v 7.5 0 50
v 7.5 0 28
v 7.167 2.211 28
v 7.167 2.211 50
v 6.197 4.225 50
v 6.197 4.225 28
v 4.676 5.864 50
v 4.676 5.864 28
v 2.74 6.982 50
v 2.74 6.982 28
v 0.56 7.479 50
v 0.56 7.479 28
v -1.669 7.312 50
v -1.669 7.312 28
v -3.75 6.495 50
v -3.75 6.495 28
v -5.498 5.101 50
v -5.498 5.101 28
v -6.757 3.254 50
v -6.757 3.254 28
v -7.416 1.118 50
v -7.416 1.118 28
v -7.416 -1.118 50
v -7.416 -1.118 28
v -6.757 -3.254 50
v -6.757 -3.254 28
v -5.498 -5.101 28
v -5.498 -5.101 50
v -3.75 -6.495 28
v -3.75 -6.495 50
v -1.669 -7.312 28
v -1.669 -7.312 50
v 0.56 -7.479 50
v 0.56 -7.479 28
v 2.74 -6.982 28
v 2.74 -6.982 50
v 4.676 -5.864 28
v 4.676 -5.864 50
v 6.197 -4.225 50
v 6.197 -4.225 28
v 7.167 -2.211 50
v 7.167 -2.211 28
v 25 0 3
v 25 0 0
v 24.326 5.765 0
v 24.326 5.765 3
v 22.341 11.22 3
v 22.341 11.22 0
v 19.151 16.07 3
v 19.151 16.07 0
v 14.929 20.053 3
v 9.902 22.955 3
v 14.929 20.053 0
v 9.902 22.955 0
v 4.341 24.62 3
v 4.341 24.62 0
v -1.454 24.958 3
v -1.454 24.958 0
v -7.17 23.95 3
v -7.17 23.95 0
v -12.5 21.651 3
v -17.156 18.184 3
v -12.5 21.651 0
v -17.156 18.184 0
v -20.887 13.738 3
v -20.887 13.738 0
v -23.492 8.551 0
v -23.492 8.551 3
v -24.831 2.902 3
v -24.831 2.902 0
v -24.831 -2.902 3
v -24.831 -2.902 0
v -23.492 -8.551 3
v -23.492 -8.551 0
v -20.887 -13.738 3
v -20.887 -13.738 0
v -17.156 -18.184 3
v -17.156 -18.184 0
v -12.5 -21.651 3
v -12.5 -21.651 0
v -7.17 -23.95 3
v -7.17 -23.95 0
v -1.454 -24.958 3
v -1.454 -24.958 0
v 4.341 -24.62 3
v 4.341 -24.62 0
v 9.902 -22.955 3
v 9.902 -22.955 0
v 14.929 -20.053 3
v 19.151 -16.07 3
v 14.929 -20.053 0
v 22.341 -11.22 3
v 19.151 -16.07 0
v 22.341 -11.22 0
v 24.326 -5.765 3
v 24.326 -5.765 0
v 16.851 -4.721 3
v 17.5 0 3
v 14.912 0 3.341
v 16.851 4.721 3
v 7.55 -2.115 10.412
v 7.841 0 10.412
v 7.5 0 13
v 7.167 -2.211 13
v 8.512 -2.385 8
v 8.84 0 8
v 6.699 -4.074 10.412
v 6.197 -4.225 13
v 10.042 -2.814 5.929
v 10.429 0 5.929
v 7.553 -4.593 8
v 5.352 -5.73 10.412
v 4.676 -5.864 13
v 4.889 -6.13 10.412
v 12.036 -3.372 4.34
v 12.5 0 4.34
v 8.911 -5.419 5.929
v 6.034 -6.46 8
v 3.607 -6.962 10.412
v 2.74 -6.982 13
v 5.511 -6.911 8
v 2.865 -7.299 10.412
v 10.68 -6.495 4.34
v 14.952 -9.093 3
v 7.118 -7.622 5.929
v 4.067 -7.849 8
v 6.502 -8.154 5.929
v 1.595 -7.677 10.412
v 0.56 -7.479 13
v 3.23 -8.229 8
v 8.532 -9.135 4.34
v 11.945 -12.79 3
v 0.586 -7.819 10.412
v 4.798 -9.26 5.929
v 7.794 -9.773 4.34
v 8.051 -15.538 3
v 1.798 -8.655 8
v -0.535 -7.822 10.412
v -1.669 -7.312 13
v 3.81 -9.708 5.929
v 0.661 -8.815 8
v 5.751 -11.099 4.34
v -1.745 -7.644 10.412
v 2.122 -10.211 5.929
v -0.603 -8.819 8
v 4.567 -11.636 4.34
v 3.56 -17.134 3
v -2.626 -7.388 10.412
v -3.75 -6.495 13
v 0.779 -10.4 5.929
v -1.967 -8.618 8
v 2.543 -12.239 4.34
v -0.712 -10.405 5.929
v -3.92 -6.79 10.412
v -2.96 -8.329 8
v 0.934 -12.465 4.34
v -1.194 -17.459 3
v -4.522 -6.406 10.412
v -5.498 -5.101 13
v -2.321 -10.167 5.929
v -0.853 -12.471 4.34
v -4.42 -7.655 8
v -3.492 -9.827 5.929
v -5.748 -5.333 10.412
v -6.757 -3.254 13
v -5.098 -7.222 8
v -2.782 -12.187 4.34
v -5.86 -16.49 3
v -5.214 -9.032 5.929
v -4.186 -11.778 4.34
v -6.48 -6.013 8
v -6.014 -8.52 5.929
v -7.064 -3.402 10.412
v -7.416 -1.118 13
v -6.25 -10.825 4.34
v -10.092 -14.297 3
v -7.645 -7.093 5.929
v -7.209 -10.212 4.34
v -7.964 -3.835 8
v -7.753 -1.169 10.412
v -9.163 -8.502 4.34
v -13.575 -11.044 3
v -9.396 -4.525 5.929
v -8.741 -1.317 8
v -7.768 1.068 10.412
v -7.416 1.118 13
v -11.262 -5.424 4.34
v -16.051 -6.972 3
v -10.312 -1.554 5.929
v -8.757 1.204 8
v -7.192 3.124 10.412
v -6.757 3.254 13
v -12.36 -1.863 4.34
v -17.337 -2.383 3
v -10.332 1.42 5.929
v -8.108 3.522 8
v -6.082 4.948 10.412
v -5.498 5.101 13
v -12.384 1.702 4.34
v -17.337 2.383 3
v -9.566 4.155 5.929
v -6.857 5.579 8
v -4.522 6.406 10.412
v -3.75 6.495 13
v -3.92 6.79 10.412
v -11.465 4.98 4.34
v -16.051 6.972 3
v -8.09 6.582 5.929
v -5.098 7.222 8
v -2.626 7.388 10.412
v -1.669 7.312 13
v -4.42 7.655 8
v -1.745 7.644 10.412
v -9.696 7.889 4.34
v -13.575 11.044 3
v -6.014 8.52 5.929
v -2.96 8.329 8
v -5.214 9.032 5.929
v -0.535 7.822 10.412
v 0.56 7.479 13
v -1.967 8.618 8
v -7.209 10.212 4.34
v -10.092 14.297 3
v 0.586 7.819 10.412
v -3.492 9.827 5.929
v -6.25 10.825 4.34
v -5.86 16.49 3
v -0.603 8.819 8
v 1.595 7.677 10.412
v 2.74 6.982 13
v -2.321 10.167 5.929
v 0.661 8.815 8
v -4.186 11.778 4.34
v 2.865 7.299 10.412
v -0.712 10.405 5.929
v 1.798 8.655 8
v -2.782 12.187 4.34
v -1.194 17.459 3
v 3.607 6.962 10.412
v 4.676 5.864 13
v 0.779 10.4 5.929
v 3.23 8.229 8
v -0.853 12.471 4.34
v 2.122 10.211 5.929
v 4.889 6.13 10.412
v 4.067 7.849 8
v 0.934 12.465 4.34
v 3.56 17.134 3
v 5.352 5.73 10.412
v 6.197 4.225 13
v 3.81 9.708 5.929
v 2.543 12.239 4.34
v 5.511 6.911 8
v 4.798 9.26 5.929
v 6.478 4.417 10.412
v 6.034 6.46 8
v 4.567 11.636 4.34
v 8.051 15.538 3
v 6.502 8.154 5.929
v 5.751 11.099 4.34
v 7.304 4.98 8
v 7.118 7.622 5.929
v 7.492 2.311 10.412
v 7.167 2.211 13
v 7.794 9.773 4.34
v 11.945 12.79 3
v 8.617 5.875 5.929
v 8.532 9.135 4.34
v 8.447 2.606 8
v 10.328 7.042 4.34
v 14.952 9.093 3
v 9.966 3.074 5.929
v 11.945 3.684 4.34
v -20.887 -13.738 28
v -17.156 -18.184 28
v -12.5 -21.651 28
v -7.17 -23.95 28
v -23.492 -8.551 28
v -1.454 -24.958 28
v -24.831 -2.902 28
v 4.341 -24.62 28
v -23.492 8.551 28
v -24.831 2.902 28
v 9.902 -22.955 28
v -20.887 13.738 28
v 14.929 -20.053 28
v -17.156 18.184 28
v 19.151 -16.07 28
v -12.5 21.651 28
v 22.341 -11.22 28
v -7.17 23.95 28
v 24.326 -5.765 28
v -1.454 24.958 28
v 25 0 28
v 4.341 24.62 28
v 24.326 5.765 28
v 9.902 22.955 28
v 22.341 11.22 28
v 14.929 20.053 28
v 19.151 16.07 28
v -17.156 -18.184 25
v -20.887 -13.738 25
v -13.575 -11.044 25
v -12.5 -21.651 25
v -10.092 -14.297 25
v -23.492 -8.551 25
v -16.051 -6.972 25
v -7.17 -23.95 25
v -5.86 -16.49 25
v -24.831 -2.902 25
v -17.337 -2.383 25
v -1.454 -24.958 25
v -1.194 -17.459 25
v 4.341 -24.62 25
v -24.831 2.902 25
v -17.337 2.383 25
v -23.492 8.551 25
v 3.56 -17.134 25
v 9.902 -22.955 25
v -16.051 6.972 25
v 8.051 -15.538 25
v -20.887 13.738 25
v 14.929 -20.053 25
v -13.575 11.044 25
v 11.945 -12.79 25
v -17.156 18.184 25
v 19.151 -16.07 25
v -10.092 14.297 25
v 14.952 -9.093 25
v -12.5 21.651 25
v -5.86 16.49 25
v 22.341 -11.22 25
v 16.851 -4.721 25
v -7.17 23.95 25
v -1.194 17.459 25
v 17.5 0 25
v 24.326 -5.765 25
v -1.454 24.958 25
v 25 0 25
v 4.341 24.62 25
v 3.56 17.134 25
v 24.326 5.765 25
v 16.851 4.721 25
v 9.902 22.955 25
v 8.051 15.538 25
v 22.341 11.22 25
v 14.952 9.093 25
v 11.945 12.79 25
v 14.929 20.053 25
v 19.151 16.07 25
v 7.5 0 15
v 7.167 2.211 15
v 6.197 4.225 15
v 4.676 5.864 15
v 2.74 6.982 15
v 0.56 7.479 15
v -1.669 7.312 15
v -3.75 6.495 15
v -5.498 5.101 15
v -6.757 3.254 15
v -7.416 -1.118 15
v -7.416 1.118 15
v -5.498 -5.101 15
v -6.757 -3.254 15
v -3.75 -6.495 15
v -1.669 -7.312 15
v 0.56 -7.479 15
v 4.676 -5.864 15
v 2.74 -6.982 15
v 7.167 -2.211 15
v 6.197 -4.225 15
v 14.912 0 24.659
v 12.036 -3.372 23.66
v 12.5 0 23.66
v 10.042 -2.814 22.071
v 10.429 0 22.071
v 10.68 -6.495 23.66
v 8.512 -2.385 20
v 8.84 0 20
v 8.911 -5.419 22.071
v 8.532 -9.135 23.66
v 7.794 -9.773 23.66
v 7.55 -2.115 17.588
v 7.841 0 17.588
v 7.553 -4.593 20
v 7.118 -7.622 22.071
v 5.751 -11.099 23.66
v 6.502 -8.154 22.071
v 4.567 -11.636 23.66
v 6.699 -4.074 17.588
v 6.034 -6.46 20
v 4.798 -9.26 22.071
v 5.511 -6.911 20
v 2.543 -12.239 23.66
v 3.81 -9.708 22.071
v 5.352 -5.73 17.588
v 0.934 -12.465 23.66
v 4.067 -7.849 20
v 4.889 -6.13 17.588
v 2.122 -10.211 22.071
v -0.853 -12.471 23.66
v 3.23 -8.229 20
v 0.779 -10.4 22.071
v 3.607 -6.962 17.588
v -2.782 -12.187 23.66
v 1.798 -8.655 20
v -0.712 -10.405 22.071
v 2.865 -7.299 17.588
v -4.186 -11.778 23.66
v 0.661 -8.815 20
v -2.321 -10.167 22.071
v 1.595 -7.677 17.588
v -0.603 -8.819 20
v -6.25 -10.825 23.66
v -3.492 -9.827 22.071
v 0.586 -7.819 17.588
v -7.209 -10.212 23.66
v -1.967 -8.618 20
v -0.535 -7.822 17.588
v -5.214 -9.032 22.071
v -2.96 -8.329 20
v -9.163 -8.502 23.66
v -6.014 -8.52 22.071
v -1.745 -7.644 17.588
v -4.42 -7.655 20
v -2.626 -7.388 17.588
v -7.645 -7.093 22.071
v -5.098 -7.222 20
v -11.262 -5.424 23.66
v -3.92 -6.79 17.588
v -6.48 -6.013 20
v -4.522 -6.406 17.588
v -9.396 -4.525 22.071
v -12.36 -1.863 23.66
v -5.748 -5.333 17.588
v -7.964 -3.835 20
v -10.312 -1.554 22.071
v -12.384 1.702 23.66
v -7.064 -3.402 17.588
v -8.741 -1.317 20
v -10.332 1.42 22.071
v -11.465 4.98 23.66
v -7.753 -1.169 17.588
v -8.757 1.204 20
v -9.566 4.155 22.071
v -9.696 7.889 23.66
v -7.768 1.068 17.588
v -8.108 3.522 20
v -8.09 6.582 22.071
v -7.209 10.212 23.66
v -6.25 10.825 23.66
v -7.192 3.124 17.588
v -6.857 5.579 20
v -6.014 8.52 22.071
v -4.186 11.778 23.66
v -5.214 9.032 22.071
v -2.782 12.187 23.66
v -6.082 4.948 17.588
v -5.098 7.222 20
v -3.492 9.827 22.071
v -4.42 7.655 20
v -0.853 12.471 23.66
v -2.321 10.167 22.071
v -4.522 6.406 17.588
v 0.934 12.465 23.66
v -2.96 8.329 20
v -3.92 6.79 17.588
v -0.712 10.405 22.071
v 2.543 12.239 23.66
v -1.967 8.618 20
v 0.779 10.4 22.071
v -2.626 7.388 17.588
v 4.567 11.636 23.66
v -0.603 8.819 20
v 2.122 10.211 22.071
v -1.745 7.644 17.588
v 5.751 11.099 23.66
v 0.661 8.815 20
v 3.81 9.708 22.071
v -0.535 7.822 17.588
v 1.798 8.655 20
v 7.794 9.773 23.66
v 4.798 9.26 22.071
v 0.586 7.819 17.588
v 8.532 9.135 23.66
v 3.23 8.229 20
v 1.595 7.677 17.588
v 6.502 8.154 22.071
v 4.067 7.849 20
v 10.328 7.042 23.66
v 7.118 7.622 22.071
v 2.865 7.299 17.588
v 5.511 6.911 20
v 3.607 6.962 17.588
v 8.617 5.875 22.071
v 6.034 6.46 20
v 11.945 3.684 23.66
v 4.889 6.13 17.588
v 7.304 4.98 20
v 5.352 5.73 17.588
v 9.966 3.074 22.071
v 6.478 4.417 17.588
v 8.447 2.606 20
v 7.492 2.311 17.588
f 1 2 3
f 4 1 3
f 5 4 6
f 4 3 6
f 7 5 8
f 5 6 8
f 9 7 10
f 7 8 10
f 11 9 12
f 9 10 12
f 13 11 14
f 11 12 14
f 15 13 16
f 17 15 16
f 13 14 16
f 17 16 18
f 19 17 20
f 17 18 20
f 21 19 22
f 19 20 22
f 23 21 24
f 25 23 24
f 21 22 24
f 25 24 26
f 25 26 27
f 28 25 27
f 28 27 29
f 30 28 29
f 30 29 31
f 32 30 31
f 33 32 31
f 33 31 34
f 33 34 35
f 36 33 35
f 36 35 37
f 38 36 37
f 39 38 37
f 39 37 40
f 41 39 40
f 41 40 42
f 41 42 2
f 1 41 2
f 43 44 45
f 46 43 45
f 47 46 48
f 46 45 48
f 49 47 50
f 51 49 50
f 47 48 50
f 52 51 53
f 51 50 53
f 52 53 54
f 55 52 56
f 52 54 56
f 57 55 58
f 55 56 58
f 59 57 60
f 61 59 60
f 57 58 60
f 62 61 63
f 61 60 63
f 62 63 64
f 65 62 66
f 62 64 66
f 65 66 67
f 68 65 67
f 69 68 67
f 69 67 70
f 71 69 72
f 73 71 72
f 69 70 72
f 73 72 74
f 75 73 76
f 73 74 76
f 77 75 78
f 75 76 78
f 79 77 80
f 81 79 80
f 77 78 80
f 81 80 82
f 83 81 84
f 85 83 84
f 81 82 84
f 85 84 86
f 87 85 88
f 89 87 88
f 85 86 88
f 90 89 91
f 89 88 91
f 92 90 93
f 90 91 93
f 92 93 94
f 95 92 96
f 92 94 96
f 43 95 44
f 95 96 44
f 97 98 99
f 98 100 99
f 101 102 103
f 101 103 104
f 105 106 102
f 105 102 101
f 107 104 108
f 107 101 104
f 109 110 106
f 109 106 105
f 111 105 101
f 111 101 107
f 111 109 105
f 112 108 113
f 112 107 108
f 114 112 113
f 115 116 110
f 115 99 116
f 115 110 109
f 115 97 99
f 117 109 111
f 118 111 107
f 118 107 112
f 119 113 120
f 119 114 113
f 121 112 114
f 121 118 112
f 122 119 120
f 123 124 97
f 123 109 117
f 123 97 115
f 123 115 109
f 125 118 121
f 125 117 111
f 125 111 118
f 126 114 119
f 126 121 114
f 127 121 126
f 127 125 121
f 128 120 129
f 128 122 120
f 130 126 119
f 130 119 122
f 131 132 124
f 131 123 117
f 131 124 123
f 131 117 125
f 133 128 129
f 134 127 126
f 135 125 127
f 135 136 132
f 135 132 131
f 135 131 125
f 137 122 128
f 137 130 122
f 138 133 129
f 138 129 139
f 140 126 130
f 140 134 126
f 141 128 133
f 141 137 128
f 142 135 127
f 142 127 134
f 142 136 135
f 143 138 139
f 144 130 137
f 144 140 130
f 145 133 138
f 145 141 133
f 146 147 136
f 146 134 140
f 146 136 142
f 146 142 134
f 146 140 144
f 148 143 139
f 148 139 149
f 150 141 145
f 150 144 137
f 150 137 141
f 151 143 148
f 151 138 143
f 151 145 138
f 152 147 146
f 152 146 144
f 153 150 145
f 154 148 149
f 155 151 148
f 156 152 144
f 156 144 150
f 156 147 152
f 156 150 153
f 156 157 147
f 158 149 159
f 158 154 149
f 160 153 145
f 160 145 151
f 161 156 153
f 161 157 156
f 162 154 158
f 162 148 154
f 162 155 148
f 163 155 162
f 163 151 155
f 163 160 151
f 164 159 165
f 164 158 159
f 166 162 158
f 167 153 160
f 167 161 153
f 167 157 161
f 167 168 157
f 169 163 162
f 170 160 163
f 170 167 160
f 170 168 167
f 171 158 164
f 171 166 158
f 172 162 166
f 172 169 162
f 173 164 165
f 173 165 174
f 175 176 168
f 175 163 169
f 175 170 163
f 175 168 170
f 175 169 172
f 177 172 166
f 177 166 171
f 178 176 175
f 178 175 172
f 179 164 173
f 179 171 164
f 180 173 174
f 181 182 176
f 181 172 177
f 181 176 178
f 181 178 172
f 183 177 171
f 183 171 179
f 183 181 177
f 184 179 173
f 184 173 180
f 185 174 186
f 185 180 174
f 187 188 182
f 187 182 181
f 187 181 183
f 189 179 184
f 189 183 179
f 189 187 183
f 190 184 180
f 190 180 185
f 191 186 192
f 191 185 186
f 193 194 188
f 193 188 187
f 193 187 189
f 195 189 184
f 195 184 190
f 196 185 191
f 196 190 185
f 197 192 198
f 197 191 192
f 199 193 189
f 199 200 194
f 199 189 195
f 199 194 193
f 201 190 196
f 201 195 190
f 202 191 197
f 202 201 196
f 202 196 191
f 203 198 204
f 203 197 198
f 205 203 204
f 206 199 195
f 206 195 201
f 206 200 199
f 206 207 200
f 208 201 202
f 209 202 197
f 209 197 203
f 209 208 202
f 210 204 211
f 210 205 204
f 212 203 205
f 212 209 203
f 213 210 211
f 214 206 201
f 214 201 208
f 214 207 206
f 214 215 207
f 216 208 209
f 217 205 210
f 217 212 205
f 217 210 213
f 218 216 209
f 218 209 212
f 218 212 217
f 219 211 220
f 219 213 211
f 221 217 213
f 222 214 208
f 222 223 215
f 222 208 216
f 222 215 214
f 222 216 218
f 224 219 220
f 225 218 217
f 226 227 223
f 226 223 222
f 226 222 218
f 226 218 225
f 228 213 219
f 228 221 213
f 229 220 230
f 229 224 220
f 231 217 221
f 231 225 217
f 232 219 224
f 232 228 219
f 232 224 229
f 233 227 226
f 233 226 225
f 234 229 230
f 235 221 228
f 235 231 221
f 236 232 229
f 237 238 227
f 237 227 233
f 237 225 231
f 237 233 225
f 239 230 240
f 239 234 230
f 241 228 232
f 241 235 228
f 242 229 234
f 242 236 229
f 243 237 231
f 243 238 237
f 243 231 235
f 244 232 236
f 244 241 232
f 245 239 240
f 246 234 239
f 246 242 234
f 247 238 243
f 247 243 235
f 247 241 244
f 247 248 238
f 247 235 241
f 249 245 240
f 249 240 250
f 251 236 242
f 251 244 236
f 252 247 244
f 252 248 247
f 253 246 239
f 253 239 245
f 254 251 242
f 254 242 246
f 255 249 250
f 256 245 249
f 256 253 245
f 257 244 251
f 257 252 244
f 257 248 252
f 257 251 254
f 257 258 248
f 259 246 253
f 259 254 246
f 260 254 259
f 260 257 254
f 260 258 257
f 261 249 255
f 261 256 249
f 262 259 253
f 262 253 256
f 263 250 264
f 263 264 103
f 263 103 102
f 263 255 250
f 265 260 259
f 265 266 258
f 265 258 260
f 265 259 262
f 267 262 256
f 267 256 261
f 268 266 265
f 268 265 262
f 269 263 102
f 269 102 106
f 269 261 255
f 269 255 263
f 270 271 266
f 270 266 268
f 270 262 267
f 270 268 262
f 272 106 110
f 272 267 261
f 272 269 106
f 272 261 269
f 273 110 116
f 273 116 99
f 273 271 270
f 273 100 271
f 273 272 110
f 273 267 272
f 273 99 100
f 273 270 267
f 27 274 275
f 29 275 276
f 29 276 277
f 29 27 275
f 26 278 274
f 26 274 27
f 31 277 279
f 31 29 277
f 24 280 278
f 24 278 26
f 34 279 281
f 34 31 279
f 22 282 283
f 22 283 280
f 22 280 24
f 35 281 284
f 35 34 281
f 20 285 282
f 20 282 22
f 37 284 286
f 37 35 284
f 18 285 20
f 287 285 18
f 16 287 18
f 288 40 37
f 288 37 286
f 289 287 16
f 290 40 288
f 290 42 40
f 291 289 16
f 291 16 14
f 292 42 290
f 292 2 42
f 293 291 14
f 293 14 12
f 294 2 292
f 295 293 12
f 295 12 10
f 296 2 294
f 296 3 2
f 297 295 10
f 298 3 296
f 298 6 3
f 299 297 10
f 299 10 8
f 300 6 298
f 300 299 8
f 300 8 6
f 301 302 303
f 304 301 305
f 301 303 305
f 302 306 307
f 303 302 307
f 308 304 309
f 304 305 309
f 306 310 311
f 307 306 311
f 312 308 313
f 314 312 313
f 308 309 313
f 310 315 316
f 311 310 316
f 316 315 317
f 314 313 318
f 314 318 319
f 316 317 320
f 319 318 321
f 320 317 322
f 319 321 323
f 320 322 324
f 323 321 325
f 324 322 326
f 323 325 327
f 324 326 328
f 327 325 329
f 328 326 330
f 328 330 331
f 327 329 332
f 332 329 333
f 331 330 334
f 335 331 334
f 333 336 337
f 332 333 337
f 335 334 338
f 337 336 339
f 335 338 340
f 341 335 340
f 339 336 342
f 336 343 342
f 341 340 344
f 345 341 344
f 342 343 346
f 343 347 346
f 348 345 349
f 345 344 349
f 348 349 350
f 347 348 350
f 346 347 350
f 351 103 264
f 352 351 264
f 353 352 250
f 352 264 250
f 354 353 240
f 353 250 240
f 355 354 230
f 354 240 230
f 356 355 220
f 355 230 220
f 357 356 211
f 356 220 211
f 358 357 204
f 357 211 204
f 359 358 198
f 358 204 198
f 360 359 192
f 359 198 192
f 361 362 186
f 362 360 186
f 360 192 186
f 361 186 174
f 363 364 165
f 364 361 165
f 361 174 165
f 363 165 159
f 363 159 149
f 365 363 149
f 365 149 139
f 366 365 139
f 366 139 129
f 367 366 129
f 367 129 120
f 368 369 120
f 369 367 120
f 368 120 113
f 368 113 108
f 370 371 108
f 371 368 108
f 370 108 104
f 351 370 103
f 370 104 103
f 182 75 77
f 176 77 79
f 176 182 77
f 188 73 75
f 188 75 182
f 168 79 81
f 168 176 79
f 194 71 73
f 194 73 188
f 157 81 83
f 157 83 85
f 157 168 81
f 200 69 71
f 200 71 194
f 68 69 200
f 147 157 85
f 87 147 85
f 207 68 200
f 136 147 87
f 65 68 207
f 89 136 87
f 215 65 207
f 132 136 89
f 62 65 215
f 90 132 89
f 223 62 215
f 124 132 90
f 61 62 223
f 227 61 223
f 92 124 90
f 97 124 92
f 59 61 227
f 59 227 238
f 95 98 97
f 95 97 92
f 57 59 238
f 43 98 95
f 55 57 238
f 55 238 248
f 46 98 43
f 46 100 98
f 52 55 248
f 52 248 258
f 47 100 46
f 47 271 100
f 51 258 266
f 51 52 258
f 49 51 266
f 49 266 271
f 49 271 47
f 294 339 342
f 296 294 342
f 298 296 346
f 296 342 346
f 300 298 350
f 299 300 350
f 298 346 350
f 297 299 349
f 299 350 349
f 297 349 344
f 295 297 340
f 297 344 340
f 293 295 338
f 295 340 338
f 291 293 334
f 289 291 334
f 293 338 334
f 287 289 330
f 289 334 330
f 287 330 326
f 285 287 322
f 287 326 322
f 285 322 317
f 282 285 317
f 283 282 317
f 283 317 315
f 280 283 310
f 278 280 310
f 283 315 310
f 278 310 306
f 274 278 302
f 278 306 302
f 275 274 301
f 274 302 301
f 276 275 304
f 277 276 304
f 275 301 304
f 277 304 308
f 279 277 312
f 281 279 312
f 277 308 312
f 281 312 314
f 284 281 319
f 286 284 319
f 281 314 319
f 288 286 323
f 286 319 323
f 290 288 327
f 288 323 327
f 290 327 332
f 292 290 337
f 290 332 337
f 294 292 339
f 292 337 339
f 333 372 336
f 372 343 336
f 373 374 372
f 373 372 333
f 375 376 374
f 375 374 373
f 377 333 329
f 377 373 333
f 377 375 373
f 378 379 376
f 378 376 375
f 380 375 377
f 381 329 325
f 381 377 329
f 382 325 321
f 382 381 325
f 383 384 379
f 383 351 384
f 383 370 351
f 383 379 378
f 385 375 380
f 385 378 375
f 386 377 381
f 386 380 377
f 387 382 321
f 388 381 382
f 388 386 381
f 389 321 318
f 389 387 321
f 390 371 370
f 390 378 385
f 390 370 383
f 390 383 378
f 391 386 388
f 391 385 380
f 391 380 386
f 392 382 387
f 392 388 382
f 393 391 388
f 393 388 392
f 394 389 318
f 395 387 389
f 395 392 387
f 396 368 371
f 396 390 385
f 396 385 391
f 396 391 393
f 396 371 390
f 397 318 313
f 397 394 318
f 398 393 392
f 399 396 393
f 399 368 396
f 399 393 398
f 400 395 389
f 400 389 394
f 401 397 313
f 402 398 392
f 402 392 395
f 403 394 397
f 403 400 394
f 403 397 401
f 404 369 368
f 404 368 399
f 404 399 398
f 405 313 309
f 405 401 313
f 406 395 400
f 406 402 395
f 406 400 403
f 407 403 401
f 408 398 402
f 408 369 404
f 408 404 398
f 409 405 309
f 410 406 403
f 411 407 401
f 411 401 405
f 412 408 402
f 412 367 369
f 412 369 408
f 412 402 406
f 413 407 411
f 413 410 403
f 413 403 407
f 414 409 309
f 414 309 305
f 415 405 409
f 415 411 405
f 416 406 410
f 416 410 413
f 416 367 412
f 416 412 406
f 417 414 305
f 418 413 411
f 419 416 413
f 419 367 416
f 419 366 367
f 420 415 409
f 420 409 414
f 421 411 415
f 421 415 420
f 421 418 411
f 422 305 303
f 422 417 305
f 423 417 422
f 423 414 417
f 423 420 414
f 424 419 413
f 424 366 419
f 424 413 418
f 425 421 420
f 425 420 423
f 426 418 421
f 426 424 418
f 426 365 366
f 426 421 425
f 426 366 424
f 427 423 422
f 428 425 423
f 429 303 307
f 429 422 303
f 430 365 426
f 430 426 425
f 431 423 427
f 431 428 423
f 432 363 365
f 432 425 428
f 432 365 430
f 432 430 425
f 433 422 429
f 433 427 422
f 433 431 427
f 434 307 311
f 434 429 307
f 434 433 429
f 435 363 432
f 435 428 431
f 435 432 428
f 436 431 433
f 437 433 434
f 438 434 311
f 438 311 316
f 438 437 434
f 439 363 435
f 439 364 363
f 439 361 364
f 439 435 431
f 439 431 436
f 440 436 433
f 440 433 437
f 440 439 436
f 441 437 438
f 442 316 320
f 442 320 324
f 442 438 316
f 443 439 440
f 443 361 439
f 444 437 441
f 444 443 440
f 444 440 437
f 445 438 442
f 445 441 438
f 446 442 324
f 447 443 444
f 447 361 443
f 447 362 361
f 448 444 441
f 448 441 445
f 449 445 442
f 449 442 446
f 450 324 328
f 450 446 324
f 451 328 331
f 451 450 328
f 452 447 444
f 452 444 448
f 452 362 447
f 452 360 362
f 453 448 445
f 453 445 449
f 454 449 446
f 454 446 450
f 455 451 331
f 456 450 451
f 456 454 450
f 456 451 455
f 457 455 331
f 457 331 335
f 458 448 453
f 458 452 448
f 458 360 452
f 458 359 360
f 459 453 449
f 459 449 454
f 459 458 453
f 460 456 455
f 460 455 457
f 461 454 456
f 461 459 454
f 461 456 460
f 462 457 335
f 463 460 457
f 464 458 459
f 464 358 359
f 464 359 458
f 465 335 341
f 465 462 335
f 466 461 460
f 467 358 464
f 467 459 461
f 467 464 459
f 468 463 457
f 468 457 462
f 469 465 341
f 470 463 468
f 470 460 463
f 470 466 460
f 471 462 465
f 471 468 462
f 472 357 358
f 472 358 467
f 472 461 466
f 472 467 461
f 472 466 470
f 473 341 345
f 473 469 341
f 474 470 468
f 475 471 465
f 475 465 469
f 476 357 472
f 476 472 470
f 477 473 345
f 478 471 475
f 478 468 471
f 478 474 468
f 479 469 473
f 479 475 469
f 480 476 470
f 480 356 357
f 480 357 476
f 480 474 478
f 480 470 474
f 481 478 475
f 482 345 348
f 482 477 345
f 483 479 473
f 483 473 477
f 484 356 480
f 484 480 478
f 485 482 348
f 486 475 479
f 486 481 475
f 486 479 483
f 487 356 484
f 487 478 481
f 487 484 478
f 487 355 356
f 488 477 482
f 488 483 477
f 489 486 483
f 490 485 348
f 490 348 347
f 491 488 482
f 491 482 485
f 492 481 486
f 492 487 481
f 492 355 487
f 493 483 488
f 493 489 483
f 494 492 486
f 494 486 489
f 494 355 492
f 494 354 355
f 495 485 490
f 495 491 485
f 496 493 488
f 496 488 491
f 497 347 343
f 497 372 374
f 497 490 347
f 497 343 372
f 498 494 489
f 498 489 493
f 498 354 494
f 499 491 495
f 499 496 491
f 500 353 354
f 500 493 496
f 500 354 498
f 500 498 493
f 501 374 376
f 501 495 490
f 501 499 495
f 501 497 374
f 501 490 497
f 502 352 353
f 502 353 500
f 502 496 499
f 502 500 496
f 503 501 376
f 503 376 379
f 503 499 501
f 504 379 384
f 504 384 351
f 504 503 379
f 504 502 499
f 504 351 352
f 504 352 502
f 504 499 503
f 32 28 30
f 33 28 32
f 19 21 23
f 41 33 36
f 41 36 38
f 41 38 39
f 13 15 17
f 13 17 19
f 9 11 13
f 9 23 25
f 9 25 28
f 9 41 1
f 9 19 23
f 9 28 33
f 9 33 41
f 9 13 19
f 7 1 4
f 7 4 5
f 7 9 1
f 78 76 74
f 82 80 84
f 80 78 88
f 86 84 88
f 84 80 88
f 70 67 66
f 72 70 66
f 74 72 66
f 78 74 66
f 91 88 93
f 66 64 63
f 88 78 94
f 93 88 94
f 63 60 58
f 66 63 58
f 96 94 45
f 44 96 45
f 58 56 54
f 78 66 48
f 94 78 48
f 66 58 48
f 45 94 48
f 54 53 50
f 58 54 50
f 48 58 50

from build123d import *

# Parameters (mm, degrees)
CROQUIS1_R              = 7.5
SALIENTE_EXTRUIR2_DEPTH = 50
CROQUIS4_R              = 25
SALIENTE_EXTRUIR3_DEPTH = 3
SALIENTE_EXTRUIR4_START = 25
CROQUIS5_R              = 25
SALIENTE_EXTRUIR4_DEPTH = 3
REDONDEO2_R             = 10


with BuildPart() as part:
    # Croquis1 → Saliente-Extruir2 (new body)
    with BuildSketch(Plane.XY):
        Circle(CROQUIS1_R)
    extrude(amount=SALIENTE_EXTRUIR2_DEPTH)

    # Croquis4 → Saliente-Extruir3 (add)
    with BuildSketch(Plane.XY):
        Circle(CROQUIS4_R)
    extrude(amount=SALIENTE_EXTRUIR3_DEPTH)

    # Croquis5 → Saliente-Extruir4 (add)
    with BuildSketch(Plane.XY.offset(SALIENTE_EXTRUIR4_START)):
        Circle(CROQUIS5_R)
    extrude(amount=SALIENTE_EXTRUIR4_DEPTH)

    # Redondeo2
    redondeo2_edges = [part.edges().sort_by_distance(p)[0] for p in [
        (-7.5, 0, 25),
        (-7.5, 0, 3),
    ]]
    fillet(redondeo2_edges, radius=REDONDEO2_R)


solid = part.part
